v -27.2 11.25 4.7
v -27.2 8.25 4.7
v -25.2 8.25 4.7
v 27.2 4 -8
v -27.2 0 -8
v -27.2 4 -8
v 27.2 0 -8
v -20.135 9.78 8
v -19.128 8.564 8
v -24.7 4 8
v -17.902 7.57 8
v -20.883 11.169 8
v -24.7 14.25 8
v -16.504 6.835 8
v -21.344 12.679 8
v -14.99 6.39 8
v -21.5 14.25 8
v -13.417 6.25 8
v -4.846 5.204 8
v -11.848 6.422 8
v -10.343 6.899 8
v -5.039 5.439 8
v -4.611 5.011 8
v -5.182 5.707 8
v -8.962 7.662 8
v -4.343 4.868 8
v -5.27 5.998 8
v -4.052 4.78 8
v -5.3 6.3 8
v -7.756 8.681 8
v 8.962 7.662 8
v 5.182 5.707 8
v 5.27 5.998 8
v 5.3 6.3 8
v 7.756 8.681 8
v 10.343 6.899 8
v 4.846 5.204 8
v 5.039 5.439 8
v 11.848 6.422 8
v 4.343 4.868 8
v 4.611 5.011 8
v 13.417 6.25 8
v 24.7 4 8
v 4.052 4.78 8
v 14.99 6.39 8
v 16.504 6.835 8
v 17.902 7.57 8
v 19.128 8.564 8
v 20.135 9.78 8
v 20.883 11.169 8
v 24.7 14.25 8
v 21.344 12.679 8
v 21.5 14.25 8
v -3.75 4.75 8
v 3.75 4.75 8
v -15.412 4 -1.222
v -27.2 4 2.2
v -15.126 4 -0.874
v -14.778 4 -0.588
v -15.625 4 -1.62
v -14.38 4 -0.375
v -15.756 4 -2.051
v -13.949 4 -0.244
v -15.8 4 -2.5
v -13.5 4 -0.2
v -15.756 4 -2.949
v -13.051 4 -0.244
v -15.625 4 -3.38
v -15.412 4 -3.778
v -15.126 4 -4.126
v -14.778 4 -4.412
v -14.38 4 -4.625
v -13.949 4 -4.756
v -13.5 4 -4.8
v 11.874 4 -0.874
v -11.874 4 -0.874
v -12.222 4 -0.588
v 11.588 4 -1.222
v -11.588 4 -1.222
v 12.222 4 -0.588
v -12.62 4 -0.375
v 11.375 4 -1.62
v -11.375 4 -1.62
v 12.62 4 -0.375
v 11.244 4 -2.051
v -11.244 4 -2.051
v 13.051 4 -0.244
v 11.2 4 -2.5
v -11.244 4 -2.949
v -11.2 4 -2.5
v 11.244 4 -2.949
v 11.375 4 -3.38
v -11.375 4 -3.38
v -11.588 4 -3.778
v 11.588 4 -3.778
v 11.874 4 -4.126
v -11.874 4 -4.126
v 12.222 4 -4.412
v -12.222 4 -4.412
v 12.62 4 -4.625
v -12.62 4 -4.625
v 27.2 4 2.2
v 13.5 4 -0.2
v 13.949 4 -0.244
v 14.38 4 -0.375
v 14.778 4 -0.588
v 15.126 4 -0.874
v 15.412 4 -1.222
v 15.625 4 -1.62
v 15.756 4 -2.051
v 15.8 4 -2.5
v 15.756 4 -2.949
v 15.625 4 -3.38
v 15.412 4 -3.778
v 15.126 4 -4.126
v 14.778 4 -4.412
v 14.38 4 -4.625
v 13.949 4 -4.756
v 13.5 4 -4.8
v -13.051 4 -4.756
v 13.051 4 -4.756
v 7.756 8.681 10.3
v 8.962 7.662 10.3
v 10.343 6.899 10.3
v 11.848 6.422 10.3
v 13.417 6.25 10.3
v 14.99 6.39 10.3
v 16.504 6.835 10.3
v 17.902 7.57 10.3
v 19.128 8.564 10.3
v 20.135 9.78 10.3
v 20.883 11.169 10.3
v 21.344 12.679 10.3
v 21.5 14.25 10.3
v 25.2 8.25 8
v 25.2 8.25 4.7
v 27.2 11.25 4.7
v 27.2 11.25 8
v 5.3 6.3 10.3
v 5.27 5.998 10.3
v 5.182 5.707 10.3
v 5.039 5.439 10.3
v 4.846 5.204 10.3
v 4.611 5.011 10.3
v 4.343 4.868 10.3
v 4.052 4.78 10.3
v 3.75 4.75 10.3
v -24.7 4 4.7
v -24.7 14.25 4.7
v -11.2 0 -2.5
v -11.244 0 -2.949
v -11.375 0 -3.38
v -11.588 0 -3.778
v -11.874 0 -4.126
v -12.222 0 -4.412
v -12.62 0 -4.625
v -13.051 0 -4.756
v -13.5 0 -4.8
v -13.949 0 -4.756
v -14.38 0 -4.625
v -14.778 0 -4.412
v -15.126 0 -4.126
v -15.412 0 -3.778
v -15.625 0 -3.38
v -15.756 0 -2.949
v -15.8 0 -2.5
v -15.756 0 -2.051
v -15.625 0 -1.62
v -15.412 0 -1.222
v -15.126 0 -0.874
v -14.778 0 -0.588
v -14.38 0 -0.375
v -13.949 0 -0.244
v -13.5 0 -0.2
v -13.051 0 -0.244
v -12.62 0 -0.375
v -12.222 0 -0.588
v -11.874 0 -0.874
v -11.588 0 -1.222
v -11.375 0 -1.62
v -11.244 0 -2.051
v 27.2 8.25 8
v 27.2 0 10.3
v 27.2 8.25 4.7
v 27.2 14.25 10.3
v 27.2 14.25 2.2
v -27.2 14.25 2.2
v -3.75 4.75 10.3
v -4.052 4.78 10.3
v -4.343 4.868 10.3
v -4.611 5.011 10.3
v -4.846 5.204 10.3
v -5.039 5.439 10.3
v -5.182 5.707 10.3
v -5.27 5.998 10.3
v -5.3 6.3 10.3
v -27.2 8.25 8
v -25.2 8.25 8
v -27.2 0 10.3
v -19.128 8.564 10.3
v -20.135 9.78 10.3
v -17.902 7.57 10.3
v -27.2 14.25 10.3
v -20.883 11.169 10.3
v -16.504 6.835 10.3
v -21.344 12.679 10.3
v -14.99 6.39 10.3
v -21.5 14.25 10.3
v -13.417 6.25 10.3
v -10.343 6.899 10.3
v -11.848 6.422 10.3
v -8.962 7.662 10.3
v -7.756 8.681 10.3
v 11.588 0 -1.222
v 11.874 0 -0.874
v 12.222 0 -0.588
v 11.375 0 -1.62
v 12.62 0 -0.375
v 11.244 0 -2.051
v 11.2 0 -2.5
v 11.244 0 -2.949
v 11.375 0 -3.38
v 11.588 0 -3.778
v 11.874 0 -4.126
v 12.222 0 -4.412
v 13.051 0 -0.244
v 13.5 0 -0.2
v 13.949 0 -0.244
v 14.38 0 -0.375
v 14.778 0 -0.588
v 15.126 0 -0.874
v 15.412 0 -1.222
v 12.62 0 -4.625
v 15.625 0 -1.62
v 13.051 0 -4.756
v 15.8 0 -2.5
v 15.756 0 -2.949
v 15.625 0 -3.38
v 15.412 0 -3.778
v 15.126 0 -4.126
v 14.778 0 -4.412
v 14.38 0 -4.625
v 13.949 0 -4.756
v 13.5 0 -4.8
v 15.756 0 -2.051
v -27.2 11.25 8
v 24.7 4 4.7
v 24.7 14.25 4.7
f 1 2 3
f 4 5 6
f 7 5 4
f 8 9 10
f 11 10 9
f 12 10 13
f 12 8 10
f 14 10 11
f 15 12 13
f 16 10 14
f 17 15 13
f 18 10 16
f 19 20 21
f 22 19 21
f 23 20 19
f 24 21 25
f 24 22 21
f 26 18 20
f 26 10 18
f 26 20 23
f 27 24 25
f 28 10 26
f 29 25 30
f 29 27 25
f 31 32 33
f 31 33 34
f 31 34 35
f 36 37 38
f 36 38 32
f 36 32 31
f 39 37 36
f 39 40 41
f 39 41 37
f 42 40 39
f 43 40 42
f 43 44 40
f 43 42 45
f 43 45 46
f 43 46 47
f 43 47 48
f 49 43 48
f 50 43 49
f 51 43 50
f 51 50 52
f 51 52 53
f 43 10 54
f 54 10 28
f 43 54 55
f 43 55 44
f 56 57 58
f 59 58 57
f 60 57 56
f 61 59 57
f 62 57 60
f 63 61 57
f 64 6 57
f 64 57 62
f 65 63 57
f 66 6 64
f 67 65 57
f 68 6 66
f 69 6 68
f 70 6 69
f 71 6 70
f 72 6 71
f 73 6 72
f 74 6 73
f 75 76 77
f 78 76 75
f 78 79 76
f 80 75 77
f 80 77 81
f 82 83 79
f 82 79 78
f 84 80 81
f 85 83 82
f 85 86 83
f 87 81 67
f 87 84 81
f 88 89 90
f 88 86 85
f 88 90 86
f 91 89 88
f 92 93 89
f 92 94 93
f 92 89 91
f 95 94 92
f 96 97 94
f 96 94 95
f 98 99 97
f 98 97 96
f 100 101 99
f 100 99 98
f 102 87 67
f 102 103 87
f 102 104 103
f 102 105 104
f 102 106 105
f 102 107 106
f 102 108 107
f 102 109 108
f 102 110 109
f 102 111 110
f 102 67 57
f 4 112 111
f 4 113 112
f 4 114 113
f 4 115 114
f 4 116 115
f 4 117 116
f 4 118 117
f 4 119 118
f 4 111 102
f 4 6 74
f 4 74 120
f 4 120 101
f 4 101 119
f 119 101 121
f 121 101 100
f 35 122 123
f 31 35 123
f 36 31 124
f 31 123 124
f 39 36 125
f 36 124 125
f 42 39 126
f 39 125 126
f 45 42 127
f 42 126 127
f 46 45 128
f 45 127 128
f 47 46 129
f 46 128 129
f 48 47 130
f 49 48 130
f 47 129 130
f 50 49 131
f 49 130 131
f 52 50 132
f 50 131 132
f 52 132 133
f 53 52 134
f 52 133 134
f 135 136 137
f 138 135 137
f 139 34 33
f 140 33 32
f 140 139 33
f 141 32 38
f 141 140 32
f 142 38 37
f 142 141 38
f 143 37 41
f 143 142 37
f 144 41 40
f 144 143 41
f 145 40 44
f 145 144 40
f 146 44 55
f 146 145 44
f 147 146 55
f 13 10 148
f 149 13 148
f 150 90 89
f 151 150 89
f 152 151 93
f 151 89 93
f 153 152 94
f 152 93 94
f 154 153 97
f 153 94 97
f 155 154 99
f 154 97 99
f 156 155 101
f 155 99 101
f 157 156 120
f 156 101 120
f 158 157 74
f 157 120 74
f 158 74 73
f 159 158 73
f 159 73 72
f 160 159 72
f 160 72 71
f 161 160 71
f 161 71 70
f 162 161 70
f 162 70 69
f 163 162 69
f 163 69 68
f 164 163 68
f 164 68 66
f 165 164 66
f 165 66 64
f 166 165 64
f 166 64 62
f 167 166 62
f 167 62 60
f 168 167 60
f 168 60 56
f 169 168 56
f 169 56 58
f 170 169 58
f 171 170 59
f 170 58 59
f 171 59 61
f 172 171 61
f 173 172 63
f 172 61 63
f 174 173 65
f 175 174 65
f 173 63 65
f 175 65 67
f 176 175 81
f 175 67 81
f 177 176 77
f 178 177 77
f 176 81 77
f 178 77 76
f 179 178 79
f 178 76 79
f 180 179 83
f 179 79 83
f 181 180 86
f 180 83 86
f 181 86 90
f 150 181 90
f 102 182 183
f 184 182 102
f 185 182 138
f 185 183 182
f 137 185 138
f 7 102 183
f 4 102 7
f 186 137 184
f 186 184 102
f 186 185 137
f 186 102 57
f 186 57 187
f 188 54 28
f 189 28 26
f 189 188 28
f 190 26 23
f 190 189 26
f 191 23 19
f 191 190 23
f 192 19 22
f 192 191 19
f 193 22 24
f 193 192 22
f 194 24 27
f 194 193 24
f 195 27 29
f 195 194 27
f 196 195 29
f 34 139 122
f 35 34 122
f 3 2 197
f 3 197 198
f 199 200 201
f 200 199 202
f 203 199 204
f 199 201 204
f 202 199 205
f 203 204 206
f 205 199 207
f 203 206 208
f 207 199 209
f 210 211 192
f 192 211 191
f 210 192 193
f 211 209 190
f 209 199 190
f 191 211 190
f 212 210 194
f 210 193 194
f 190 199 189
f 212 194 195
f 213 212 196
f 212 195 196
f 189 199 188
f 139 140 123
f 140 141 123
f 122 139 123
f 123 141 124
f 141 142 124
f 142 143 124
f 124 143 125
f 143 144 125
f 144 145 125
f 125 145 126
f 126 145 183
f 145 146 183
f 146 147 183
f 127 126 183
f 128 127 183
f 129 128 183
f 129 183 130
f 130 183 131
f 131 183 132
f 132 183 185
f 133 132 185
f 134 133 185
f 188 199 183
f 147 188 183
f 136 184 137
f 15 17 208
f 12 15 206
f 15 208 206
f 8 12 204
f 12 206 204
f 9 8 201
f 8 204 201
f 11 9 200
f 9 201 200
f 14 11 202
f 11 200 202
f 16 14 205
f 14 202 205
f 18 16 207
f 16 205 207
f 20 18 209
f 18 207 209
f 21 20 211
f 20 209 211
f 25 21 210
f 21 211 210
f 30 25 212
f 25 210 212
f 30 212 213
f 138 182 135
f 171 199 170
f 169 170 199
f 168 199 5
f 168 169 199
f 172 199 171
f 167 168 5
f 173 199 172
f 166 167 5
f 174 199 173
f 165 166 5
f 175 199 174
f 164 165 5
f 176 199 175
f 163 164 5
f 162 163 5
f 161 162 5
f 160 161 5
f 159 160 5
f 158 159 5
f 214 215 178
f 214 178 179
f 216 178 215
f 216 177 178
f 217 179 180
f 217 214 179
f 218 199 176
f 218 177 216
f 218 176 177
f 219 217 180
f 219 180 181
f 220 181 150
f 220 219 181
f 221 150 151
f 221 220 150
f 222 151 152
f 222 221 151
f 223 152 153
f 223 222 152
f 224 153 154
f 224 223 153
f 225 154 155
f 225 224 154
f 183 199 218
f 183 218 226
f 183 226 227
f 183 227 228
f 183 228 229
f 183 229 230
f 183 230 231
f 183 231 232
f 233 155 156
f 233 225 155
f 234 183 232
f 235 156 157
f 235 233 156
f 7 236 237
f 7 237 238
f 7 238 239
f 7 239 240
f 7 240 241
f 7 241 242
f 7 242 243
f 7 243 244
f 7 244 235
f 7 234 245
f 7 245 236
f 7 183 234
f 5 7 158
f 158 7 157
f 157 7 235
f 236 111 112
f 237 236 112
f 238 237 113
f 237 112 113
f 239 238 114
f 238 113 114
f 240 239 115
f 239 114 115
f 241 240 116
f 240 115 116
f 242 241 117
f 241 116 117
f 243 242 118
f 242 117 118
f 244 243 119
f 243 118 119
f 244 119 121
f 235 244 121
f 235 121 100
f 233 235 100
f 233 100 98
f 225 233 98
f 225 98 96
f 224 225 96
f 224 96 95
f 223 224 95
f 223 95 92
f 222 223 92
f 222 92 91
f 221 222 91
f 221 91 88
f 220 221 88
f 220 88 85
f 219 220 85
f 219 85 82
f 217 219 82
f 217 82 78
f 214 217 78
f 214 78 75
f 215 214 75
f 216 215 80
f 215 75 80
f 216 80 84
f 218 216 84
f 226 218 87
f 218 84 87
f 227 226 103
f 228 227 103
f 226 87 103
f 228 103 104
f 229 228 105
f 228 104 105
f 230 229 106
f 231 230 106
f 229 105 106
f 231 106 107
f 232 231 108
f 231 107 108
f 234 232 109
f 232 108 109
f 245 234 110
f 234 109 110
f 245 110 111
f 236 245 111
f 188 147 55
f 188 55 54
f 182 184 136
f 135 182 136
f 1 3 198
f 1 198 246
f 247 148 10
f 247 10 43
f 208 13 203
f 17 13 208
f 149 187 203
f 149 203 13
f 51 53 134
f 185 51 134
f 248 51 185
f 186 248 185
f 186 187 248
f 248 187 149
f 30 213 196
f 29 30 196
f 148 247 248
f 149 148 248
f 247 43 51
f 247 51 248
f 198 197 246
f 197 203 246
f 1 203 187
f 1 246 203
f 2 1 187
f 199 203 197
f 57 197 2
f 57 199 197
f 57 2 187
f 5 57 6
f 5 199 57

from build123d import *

# Parameters (mm, degrees)
SKETCH2_W           = 54.4
SKETCH2_H           = 16
BOSS_EXTRUDE1_DEPTH = 4
SKETCH3_W           = 2.3
SKETCH3_H           = 24
BOSS_EXTRUDE2_DEPTH = 54.4
SKETCH4_R           = 2.3
CUT_EXTRUDE1_DEPTH  = 45
CUT_EXTRUDE3_DEPTH  = 10
SKETCH5_R           = 8
CUT_EXTRUDE2_DEPTH  = 10
CUT_EXTRUDE4_DEPTH  = 10
SKETCH8_W           = 2.5
SKETCH8_H           = 10.25
BOSS_EXTRUDE3_DEPTH = 54.4
SKETCH9_W           = 2.5
SKETCH9_H           = 3.3
BOSS_EXTRUDE4_DEPTH = 10.25
CUT_EXTRUDE5_DEPTH  = 3.3


with BuildPart() as part:
    # Sketch2 → Boss-Extrude1 (new body)
    with BuildSketch(Plane(origin=(0, 0, 0), x_dir=(1, 0, 0), z_dir=(0, 1, 0))):
        Rectangle(SKETCH2_W, SKETCH2_H)
    extrude(amount=BOSS_EXTRUDE1_DEPTH)

    # Sketch3 → Boss-Extrude2 (add)
    with BuildSketch(Plane(origin=(27.2, 0, 0), x_dir=(0, 0, -1), z_dir=(1, 0, 0))):
        with Locations((-9.15, 12)):
            Rectangle(SKETCH3_W, SKETCH3_H)
    extrude(amount=-BOSS_EXTRUDE2_DEPTH)

    # Sketch4 → Cut-Extrude1 (cut)
    with BuildSketch(Plane(origin=(0, 4, 0), x_dir=(1, 0, 0), z_dir=(0, 1, 0))):
        with Locations((-13.5, 2.5)):
            Circle(SKETCH4_R)
        with Locations((13.5, 2.5)):
            Circle(SKETCH4_R)
    extrude(amount=-CUT_EXTRUDE1_DEPTH, mode=Mode.SUBTRACT)

    # Sketch6 → Cut-Extrude3 (cut)
    with BuildSketch(Plane.XY.offset(10.3)):
        with BuildLine():
            Line((-3.75, 7.85), (3.75, 7.85))
            ThreePointArc((3.75, 7.85), (5.3, 6.3), (3.75, 4.75))
            Line((3.75, 4.75), (-3.75, 4.75))
            ThreePointArc((-3.75, 4.75), (-5.3, 6.3), (-3.75, 7.85))
        make_face()
    extrude(amount=-CUT_EXTRUDE3_DEPTH, mode=Mode.SUBTRACT)

    # Sketch5 → Cut-Extrude2 (cut)
    with BuildSketch(Plane.XY.offset(10.3)):
        with Locations((-13.5, 14.25)):
            Circle(SKETCH5_R)
        with Locations((13.5, 14.25)):
            Circle(SKETCH5_R)
    extrude(amount=-CUT_EXTRUDE2_DEPTH, mode=Mode.SUBTRACT)

    # Sketch7 → Cut-Extrude4 (cut)
    with BuildSketch(Plane.XY.offset(10.3)):
        Polygon((-35.24269893, 14.25), (-13.5, 14.25), (-5.3, 6.3), (0, 6.5), (5.3, 6.3), (13.5, 14.25), (21.5, 14.25), (36.006358293, 14.25), (36.006358293, 27.887641337), (-35.24269893, 27.887641337), align=None)
    extrude(amount=-CUT_EXTRUDE4_DEPTH, mode=Mode.SUBTRACT)

    # Sketch8 → Boss-Extrude3 (add)
    with BuildSketch(Plane(origin=(27.2, 0, 0), x_dir=(0, 0, -1), z_dir=(1, 0, 0))):
        with Locations((-3.45, 9.125)):
            Rectangle(SKETCH8_W, SKETCH8_H)
    extrude(amount=-BOSS_EXTRUDE3_DEPTH)

    # Sketch9 → Boss-Extrude4 (add)
    with BuildSketch(Plane(origin=(0, 4, 0), x_dir=(1, 0, 0), z_dir=(0, 1, 0))):
        with Locations((-25.95, -6.35)):
            Rectangle(SKETCH9_W, SKETCH9_H)
        with Locations((25.95, -6.35)):
            Rectangle(SKETCH9_W, SKETCH9_H)
    extrude(amount=BOSS_EXTRUDE4_DEPTH)

    # Sketch10 → Cut-Extrude5 (cut)
    with BuildSketch(Plane.XY.offset(4.7)):
        Polygon((-27.2, 8.25), (-25.2, 8.25), (-27.2, 11.25), align=None)
        Polygon((27.2, 11.25), (27.2, 8.25), (25.2, 8.25), align=None)
    extrude(amount=CUT_EXTRUDE5_DEPTH, mode=Mode.SUBTRACT)


solid = part.part
